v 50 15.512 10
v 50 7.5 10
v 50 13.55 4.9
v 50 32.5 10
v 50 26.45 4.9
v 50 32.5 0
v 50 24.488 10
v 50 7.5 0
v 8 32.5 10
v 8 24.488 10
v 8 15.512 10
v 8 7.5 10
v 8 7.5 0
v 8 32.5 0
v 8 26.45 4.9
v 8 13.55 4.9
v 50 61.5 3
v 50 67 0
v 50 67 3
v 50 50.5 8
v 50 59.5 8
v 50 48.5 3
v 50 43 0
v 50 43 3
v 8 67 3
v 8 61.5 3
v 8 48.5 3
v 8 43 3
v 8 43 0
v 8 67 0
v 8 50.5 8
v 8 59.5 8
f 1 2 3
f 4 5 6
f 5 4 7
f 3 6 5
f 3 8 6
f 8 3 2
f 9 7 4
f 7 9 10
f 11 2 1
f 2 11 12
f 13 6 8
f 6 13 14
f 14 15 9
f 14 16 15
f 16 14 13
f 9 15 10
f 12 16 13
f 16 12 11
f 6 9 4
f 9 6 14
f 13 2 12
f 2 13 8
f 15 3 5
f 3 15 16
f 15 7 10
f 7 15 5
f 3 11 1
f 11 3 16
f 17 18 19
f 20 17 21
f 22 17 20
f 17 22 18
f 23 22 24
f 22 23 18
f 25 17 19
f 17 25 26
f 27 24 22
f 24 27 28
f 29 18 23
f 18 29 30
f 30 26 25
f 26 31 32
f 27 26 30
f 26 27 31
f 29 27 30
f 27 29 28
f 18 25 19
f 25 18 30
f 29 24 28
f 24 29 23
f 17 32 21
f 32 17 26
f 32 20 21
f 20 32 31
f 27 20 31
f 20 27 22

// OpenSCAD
/*
Sample 049: Schwalbenschwanz-Verbinder — leichte Interferenz
Generated from the FDM Mechanical Sample Library.
Units: millimetres.

Override examples:
  openscad -o custom.stl -D 'view="plate"' -D 'render_fn=64' model.scad
  openscad -o preview.png -D 'view="assembly"' model.scad
*/
use <../../../library/fdm_mechanisms.scad>

render_fn = is_undef(render_fn) ? 48 : render_fn;
view = is_undef(view) ? "plate" : view;
$fn = render_fn;

sample_dovetail_joiner(
    view=view,
    clearance=-0.05,
    length=42
);
